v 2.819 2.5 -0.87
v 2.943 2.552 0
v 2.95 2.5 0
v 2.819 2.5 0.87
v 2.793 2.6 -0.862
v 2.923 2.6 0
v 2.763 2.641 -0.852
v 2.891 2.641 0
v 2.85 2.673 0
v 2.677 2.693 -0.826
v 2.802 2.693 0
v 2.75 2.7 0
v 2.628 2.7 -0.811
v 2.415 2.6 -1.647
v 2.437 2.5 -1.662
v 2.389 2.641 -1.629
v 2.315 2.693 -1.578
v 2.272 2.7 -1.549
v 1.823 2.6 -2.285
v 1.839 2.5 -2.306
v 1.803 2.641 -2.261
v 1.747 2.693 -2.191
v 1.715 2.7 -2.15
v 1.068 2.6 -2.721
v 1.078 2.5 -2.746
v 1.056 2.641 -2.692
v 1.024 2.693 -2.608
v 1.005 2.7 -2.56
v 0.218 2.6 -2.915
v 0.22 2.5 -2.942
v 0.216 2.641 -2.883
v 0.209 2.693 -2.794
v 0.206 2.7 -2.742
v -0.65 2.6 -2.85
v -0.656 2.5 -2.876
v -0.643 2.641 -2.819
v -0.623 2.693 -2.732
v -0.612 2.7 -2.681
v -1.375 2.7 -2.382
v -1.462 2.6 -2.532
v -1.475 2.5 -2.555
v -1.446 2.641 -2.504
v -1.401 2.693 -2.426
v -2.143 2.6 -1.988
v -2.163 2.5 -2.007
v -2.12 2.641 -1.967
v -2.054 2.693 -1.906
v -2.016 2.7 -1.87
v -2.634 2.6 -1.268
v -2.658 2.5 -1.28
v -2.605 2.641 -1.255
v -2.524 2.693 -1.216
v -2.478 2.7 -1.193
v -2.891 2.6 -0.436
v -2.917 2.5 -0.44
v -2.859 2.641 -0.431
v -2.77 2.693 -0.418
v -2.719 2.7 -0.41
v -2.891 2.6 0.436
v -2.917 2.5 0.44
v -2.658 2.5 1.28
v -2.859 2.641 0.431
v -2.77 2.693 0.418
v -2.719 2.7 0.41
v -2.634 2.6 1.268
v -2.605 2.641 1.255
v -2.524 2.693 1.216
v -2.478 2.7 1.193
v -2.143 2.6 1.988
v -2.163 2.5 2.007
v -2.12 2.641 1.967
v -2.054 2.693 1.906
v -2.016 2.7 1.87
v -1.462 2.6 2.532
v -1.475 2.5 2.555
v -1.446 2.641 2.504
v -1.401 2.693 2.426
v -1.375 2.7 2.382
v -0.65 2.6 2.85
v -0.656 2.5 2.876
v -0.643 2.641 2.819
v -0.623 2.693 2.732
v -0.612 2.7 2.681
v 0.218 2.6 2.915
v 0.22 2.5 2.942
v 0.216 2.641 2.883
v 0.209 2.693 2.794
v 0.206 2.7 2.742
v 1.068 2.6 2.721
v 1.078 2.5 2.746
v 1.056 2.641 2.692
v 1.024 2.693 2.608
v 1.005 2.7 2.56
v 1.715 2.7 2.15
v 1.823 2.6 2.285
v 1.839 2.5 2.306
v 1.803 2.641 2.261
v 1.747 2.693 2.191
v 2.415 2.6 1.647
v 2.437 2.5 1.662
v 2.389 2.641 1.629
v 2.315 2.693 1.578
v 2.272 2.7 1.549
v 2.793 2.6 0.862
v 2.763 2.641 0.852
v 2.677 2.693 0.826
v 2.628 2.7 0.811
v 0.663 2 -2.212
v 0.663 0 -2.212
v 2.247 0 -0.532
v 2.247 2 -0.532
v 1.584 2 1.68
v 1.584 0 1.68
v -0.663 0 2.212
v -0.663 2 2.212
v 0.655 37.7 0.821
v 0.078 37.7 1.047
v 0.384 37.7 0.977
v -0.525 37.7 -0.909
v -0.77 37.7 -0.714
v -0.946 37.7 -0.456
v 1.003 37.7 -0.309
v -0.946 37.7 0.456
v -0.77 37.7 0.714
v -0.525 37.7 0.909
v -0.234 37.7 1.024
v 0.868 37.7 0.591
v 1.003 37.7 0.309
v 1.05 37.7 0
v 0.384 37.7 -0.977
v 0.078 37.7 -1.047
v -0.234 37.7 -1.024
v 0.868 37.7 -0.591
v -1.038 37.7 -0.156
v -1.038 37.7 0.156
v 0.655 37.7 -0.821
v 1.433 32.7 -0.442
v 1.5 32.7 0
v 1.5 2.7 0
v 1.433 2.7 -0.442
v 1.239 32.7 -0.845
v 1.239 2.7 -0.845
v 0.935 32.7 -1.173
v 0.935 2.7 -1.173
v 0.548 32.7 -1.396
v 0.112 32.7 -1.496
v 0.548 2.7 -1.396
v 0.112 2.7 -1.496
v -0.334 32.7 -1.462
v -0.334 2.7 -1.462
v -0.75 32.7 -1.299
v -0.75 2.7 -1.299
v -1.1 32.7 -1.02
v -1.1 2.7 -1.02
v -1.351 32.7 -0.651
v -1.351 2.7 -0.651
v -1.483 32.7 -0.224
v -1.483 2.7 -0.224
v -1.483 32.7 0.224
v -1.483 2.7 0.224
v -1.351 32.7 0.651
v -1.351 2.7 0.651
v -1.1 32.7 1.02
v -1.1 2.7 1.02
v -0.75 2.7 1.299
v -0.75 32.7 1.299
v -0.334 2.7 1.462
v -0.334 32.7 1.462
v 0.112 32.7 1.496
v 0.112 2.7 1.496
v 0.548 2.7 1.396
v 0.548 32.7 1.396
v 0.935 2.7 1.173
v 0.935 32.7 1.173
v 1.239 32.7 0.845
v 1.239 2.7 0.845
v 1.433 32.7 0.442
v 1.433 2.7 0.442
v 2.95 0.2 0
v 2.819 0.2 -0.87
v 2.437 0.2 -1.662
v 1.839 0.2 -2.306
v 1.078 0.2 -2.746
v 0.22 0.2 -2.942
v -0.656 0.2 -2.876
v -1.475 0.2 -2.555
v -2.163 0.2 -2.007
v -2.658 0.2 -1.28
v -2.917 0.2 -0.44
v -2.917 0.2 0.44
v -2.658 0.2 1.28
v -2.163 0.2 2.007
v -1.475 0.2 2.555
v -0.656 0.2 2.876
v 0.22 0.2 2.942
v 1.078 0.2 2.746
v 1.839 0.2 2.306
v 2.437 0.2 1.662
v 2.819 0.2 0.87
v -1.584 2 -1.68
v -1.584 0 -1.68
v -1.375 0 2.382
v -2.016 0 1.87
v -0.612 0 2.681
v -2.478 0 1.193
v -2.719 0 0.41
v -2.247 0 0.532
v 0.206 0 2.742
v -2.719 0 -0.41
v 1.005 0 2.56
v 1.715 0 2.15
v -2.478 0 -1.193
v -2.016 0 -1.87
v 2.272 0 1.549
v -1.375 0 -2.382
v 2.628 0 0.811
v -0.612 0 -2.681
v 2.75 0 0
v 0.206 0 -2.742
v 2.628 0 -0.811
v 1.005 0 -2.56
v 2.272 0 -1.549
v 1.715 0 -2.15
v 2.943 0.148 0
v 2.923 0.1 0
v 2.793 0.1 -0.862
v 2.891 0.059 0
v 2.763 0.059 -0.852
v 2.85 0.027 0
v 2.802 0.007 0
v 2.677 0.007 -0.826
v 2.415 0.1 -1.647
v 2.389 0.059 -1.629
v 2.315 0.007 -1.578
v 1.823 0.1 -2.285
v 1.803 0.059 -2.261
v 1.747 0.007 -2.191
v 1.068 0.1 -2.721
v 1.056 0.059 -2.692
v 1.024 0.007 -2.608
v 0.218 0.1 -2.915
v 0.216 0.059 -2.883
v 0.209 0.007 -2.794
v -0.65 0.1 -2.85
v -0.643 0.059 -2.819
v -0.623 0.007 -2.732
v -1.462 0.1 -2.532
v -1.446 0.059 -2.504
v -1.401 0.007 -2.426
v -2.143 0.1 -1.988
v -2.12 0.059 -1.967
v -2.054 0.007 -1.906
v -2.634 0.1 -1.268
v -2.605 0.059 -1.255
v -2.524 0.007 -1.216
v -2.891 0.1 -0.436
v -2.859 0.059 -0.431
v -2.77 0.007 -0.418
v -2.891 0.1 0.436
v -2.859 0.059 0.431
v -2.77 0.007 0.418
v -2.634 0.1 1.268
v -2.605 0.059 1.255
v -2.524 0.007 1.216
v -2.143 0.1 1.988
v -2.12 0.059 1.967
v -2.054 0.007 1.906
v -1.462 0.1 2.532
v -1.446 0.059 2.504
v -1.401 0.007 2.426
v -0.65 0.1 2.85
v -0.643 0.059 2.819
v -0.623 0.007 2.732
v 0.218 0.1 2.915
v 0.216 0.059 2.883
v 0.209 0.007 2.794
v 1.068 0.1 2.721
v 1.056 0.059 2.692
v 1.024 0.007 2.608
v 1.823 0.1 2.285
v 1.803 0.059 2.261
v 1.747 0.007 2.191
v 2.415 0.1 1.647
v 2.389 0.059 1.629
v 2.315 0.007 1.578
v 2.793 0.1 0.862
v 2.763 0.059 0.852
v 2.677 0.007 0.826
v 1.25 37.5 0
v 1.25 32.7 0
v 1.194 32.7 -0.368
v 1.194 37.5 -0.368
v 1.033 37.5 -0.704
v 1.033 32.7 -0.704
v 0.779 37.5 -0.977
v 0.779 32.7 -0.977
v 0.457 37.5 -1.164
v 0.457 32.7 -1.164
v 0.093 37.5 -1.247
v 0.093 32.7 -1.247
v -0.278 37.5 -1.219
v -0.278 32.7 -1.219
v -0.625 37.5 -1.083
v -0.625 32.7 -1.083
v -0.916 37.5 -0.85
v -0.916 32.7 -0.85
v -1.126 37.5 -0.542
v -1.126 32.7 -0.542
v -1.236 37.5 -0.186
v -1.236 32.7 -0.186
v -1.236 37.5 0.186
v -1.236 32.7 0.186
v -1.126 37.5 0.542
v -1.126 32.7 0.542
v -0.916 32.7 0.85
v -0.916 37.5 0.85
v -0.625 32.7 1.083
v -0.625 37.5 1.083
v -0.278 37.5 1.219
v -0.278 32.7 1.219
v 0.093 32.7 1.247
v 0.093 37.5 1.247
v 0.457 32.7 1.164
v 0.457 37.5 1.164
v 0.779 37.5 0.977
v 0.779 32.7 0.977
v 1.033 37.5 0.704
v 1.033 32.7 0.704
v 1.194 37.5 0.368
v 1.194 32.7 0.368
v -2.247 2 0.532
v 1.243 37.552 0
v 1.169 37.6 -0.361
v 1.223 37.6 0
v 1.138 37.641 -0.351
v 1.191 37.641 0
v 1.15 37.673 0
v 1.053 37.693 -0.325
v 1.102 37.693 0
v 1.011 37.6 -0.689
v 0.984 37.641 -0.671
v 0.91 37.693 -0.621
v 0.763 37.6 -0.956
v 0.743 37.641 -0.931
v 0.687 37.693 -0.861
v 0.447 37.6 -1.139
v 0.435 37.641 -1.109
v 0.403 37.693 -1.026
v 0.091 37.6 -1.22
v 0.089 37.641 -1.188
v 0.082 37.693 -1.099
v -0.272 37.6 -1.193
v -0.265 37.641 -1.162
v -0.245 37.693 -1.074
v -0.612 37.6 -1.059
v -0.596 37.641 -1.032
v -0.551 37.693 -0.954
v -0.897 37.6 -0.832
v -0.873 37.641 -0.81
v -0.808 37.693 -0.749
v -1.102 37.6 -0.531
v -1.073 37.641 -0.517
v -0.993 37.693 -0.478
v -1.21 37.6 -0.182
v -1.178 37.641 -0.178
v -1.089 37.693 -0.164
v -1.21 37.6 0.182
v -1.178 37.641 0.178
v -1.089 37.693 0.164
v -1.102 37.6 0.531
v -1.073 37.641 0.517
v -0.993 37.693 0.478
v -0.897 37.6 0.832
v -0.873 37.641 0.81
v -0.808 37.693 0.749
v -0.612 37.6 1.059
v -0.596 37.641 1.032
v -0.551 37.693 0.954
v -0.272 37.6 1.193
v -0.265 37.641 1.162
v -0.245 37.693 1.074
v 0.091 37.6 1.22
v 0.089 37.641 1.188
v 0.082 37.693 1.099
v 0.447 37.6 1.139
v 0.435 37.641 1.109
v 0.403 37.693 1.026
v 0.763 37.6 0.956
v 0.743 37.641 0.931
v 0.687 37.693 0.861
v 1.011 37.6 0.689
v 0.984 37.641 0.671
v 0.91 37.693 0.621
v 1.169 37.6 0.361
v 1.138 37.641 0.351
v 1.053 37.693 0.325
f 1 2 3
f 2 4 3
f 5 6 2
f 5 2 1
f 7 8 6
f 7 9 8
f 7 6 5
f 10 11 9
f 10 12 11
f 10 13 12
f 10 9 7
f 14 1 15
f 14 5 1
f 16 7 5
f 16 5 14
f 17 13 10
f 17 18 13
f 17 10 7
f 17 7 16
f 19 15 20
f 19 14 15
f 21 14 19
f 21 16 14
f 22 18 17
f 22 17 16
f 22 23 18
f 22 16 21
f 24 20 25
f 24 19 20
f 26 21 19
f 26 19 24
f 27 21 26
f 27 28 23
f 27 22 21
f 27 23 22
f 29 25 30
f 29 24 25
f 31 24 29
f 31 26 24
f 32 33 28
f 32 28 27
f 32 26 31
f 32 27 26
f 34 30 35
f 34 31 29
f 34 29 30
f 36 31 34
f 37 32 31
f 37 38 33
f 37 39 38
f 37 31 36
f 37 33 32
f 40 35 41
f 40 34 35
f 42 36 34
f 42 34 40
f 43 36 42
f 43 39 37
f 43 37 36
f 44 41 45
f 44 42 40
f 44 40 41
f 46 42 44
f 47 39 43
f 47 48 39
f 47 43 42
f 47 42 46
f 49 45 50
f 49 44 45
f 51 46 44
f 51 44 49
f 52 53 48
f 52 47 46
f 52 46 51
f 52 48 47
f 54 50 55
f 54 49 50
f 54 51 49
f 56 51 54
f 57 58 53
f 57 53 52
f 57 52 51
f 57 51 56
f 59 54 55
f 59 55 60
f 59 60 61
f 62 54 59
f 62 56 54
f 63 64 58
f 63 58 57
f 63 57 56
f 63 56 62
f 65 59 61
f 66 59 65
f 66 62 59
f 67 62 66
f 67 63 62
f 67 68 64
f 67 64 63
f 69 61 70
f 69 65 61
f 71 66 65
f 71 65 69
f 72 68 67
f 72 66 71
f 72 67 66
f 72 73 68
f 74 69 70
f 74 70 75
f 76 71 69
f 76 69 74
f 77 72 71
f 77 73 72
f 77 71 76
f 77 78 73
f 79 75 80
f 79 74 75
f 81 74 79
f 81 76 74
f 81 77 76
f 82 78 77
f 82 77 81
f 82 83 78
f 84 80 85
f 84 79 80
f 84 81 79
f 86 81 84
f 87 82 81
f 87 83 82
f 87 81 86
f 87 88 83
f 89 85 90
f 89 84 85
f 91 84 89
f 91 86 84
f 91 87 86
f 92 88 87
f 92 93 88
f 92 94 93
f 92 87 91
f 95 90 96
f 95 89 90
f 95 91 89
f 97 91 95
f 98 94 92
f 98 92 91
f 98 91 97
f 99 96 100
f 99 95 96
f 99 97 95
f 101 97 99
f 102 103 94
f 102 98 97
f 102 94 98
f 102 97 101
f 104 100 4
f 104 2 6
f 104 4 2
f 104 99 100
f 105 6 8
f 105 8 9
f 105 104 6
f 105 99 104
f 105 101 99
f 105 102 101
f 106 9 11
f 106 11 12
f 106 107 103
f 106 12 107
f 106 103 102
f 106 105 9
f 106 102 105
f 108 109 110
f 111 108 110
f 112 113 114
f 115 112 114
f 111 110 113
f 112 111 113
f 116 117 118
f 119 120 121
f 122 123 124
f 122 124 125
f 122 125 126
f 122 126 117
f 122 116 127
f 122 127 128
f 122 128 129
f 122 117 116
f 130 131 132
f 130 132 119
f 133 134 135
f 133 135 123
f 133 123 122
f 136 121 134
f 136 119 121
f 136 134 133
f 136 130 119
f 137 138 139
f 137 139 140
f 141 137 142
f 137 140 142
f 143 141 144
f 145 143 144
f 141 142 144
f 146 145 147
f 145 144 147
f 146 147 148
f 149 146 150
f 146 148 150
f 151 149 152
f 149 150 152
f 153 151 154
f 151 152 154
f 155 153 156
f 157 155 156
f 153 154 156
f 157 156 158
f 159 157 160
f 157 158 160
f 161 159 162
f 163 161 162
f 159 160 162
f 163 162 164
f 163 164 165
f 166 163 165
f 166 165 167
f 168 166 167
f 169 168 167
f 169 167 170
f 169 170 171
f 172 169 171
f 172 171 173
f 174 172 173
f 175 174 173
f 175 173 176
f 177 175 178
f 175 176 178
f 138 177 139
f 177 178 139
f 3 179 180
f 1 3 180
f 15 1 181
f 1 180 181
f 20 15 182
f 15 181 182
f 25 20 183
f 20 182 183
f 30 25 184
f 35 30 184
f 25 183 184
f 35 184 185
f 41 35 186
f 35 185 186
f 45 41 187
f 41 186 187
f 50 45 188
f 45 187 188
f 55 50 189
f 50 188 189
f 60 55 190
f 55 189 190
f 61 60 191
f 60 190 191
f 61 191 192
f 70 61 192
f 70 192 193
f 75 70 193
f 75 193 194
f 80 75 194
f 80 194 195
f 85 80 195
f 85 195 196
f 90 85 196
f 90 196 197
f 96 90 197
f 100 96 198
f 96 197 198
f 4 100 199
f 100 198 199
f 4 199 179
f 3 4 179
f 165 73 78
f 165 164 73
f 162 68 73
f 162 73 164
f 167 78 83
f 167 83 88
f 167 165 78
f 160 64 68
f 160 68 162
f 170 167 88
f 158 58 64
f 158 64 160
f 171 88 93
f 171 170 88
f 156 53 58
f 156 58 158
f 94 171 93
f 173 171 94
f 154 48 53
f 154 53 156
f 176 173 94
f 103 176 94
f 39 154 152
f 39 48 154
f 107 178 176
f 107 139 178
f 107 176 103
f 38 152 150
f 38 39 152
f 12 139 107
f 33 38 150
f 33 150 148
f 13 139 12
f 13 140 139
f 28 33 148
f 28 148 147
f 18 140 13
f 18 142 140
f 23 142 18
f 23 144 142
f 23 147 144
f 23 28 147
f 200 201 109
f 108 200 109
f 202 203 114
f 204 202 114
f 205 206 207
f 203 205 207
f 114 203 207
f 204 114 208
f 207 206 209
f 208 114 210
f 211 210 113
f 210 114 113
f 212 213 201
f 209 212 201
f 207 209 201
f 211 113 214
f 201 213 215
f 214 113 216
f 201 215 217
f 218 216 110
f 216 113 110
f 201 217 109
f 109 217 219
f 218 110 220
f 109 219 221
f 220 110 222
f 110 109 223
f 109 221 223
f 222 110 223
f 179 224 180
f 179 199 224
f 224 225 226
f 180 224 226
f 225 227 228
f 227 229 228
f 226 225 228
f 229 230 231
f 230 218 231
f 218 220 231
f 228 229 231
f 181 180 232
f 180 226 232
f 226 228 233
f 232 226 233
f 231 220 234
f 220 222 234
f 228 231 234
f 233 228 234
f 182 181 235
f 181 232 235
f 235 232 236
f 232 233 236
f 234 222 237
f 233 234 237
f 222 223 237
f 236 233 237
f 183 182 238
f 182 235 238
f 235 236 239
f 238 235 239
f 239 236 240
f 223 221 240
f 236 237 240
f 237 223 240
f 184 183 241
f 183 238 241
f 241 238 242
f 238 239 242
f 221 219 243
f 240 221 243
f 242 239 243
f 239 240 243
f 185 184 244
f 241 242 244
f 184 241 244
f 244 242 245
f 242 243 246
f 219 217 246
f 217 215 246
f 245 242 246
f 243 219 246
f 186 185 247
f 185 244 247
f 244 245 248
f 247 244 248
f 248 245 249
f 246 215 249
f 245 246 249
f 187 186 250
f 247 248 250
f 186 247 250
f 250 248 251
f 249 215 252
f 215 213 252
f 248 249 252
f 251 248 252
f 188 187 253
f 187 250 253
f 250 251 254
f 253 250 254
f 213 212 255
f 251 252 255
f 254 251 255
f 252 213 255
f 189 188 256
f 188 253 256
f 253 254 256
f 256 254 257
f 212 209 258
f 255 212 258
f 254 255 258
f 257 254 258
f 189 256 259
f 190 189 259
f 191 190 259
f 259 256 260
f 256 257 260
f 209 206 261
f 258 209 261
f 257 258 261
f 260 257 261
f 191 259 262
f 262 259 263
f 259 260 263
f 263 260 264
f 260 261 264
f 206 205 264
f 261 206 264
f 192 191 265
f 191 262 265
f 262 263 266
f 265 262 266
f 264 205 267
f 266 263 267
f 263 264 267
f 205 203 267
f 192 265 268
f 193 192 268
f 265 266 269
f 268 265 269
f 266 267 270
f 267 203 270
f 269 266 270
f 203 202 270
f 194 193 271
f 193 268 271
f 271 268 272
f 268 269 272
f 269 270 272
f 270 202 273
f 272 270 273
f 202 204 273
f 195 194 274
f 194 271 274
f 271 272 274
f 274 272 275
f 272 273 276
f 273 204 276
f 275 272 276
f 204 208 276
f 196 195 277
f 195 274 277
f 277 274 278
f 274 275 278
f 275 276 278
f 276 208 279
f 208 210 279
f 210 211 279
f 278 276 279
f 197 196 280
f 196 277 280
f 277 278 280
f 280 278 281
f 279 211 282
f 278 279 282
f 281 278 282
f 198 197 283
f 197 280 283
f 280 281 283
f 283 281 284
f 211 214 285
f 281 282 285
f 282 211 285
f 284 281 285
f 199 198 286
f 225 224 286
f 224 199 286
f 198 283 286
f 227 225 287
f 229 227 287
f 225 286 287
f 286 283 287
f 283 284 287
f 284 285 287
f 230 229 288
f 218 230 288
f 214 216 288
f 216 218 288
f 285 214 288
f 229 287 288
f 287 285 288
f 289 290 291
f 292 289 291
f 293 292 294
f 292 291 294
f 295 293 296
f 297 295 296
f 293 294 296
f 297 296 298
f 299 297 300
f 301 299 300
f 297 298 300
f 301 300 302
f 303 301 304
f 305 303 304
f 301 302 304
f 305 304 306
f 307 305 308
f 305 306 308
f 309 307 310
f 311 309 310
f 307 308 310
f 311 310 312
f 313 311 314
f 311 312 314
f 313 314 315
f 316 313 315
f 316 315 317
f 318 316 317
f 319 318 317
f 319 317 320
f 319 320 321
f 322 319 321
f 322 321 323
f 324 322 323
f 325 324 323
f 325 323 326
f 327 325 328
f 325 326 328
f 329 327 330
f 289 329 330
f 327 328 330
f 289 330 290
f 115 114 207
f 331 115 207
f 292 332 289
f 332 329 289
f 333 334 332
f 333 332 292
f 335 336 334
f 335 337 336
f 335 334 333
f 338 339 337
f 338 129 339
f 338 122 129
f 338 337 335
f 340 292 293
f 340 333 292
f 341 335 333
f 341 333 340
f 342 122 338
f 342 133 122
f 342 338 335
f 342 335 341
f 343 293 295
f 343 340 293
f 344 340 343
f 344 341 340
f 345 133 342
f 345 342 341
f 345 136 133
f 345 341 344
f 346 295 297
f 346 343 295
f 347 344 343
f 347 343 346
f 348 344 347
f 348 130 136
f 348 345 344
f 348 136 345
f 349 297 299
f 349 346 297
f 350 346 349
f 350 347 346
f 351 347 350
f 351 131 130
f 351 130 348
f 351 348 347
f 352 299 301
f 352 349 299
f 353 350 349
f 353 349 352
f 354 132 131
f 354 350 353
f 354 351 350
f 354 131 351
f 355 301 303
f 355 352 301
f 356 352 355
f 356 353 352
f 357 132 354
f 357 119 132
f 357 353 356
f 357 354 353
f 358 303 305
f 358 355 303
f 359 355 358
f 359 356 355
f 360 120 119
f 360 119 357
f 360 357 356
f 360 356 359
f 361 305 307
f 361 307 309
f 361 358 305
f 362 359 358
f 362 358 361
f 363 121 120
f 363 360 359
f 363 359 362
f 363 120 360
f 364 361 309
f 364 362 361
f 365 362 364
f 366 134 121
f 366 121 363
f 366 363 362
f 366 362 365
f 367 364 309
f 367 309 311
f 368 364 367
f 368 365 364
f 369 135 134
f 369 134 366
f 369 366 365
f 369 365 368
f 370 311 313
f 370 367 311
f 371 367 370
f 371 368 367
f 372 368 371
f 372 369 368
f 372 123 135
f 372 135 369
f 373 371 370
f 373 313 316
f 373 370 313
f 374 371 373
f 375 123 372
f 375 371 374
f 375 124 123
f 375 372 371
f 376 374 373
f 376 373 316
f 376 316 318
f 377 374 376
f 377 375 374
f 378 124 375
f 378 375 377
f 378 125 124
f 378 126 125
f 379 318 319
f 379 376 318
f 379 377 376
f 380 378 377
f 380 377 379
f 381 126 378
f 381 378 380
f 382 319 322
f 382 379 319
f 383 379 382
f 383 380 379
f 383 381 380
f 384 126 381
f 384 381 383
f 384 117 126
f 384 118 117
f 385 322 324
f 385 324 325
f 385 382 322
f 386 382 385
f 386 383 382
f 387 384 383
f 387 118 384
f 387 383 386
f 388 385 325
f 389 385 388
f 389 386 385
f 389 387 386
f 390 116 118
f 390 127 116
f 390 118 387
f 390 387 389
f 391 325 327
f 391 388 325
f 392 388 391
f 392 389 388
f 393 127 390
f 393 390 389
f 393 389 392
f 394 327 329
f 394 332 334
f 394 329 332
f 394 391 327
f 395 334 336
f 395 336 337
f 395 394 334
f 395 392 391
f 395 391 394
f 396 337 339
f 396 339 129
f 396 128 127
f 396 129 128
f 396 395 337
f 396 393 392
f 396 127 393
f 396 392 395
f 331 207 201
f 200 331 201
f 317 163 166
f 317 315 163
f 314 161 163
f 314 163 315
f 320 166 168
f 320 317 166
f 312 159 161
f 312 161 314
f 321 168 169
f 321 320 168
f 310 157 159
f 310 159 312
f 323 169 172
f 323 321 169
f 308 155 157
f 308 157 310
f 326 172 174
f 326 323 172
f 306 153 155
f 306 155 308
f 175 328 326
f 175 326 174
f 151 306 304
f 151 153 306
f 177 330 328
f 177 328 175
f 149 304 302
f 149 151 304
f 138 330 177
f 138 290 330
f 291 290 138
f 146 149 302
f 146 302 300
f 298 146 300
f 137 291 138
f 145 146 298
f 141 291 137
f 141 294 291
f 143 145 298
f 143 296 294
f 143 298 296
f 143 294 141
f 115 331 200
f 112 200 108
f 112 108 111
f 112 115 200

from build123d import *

# Parameters (mm, degrees)
SKETCH_1_R          = 2.95
EXTRUDE_1_DEPTH     = 2.7
SKETCH_2_R          = 1.5
EXTRUDE_2_DEPTH     = 30
SKETCH_3_R          = 1.25
EXTRUDE_3_DEPTH     = 5
CUT_EXTRUDE_1_DEPTH = 2
FILLET_1_R          = 0.2


with BuildPart() as part:
    # 草图1 → 凸台-拉伸1 (new body)
    with BuildSketch(Plane(origin=(0, 0, 0), x_dir=(1, 0, 0), z_dir=(0, 1, 0))):
        Circle(SKETCH_1_R)
    extrude(amount=EXTRUDE_1_DEPTH)

    # 草图2 → 凸台-拉伸2 (add)
    with BuildSketch(Plane(origin=(0, 2.7, 0), x_dir=(1, 0, 0), z_dir=(0, 1, 0))):
        Circle(SKETCH_2_R)
    extrude(amount=EXTRUDE_2_DEPTH)

    # 草图3 → 凸台-拉伸3 (add)
    with BuildSketch(Plane(origin=(0, 32.7, 0), x_dir=(1, 0, 0), z_dir=(0, 1, 0))):
        Circle(SKETCH_3_R)
    extrude(amount=EXTRUDE_3_DEPTH)

    # 草图4 → 切除-拉伸1 (cut)
    with BuildSketch(Plane.XZ):
        Polygon((2.247285488, -0.53201623), (1.584382314, 1.680198207), (-0.662903174, 2.212214437), (-2.247285488, 0.53201623), (-1.584382314, -1.680198207), (0.662903174, -2.212214437), align=None)
    extrude(amount=-CUT_EXTRUDE_1_DEPTH, mode=Mode.SUBTRACT)

    # 圆角1
    fillet_1_edges = [part.edges().sort_by_distance(p)[0] for p in [
        (-1.25, 37.7, 0),
        (-2.95, 0, 0),
        (-2.95, 2.7, 0),
    ]]
    fillet(fillet_1_edges, radius=FILLET_1_R)


solid = part.part
